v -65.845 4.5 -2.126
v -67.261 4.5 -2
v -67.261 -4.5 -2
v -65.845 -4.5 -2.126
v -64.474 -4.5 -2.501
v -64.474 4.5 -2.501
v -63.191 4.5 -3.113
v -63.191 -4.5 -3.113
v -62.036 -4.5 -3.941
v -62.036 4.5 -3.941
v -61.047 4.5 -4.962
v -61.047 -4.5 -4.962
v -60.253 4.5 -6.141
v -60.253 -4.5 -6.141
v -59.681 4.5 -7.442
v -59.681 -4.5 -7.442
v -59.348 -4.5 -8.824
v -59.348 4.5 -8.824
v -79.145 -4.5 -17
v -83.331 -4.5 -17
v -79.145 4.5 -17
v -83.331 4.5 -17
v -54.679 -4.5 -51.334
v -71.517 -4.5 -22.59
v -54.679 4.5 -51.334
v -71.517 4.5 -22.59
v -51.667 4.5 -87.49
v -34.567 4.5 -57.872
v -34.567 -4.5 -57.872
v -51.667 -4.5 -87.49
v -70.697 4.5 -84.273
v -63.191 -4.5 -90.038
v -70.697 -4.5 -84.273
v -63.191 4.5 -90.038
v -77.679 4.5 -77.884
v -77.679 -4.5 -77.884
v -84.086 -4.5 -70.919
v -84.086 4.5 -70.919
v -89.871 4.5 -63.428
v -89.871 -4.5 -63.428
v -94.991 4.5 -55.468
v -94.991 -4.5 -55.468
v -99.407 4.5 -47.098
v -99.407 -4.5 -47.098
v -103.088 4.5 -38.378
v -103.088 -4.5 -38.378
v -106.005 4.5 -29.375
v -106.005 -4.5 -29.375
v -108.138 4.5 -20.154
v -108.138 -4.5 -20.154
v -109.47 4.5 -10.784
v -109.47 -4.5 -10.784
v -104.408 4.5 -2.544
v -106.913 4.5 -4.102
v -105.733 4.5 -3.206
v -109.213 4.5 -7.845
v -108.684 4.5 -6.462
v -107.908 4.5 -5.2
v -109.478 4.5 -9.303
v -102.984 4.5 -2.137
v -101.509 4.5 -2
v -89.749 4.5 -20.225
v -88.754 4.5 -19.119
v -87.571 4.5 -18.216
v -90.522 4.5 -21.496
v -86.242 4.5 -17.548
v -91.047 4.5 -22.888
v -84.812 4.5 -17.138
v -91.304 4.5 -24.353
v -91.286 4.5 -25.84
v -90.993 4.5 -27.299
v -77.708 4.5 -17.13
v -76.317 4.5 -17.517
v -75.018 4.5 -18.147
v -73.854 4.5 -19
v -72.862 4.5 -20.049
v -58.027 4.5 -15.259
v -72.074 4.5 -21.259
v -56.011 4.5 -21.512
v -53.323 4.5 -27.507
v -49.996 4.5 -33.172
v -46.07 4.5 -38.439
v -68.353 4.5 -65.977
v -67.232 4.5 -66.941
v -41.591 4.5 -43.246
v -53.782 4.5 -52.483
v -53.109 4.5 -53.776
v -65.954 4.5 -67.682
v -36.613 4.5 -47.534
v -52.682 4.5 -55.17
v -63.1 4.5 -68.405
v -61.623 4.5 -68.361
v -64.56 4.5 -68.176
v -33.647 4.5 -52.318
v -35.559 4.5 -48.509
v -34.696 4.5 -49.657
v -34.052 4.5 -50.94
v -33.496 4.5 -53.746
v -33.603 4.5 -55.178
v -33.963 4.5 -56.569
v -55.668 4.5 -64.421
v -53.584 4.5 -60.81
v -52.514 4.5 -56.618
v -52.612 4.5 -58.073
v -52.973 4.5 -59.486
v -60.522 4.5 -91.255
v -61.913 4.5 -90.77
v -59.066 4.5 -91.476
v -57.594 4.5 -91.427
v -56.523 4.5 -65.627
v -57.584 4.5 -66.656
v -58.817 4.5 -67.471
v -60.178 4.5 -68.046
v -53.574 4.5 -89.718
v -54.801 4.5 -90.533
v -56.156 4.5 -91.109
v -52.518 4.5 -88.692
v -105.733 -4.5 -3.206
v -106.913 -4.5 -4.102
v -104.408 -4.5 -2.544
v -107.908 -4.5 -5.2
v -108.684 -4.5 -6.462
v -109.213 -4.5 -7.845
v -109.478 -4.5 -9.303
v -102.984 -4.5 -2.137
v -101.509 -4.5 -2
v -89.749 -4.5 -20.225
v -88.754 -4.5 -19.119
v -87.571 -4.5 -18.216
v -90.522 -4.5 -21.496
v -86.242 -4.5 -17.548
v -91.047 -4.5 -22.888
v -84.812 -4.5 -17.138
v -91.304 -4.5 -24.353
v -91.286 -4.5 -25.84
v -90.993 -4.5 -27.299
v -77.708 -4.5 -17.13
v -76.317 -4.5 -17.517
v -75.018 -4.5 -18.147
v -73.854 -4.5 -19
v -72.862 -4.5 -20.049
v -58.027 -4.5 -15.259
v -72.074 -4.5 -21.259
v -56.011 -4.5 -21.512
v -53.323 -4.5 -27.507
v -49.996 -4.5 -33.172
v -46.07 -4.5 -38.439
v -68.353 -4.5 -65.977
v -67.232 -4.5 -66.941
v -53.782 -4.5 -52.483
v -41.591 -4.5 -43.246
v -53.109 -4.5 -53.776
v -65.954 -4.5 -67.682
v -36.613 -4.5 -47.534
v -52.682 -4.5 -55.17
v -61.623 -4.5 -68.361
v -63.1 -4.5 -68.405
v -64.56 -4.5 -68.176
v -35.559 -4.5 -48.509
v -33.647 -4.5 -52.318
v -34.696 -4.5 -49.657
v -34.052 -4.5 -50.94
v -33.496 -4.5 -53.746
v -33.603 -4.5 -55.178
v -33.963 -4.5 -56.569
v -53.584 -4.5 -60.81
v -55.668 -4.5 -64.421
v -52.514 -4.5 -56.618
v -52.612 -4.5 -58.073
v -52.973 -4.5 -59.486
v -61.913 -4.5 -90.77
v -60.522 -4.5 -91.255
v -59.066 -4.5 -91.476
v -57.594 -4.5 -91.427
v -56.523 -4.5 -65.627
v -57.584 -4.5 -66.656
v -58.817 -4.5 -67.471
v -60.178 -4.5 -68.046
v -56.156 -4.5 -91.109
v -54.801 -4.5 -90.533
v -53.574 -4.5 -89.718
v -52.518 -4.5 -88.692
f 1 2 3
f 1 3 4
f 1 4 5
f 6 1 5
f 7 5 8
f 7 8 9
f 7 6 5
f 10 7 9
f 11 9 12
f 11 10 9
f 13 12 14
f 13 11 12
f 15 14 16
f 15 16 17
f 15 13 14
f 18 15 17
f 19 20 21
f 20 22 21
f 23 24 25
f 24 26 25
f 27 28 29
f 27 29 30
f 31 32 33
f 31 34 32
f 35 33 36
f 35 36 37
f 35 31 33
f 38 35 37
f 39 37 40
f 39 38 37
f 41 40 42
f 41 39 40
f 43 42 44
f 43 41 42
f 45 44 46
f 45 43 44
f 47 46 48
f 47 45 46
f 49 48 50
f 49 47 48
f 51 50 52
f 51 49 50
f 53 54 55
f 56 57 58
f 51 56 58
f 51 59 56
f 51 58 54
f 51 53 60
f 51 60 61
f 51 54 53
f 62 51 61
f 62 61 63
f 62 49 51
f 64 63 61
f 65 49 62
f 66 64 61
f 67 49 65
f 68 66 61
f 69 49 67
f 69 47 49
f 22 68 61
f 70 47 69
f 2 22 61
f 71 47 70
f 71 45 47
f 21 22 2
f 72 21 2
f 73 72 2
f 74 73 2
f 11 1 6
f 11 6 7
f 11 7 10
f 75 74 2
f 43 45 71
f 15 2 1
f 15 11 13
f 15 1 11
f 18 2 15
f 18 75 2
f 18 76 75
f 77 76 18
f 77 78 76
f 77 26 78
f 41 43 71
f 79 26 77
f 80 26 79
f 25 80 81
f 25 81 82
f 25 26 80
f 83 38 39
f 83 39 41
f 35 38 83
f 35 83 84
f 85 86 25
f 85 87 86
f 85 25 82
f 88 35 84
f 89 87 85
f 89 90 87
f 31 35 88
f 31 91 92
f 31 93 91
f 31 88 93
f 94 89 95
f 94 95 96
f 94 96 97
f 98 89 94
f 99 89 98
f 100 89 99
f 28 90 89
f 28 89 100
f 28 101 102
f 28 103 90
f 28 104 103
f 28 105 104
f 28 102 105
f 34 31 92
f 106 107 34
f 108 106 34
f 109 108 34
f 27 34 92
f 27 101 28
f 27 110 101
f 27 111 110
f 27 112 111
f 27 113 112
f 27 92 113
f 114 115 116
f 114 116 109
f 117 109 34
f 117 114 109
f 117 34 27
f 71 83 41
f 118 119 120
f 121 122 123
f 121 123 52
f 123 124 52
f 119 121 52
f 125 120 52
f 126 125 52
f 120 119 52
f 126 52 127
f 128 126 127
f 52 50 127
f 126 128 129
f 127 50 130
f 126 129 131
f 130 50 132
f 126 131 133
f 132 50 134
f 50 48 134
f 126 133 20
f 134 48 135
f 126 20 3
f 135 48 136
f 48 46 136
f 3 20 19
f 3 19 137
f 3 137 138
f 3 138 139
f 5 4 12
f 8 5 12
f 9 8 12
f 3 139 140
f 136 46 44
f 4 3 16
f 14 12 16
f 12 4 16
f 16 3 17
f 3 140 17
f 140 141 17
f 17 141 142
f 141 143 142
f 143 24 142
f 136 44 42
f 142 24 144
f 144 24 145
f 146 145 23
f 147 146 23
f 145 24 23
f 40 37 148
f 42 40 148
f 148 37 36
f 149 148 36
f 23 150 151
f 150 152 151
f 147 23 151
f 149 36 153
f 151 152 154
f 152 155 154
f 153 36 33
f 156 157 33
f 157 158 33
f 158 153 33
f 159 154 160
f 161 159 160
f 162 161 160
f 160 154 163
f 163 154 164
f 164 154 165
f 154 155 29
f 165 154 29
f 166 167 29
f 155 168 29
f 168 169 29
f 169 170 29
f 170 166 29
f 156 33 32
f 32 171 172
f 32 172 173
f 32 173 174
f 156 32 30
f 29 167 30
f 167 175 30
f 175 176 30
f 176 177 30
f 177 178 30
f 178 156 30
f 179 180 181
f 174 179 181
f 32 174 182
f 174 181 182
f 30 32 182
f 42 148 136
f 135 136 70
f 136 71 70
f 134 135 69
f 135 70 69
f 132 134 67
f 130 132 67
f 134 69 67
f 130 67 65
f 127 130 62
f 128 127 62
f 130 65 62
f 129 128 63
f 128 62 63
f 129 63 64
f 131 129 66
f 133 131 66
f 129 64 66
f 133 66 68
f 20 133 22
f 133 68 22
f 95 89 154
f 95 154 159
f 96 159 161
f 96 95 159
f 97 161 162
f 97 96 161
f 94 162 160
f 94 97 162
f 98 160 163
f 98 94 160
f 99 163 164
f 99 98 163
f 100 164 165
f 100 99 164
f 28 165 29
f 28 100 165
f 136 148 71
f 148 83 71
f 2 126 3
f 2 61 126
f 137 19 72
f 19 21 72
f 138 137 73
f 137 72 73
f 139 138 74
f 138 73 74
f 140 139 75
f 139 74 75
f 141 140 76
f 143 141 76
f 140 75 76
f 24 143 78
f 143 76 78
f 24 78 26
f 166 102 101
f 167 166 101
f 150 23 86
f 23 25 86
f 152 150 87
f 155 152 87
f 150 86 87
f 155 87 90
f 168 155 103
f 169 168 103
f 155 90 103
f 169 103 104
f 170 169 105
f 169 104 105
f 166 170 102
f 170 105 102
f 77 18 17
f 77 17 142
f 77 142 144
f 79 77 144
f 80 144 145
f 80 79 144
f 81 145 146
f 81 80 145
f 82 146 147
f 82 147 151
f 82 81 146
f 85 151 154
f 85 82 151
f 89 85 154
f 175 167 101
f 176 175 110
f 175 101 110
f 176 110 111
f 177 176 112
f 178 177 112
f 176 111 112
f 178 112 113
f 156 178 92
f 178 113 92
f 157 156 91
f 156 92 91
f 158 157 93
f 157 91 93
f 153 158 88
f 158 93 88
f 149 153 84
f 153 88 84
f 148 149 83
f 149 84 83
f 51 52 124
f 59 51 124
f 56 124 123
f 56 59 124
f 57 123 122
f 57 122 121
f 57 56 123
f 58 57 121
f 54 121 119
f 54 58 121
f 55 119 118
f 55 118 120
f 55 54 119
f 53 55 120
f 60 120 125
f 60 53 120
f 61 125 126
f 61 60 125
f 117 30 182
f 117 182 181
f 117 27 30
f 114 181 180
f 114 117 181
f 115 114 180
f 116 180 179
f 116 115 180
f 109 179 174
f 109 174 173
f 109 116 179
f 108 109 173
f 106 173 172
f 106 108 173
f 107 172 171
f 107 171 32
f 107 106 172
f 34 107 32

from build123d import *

# Parameters (mm, degrees)
BOSS_EXTRUDE1_DEPTH = 4.5


with BuildPart() as part:
    # Sketch1 → Boss-Extrude1 (new, symmetric)
    with BuildSketch(Plane(origin=(0, 0, 0), x_dir=(1, 0, 0), z_dir=(0, 1, 0))):
        with BuildLine():
            Line((-101.508620324, 2), (-67.260686883, 2))
            ThreePointArc((-67.260686883, 2), (-62.036309634, 3.941462028), (-59.347664897, 8.823529412))
            ThreePointArc((-59.347664897, 8.823529412), (-51.737318493, 30.385027154), (-36.613340144, 47.533812423))
            ThreePointArc((-36.613340144, 47.533812423), (-33.647401917, 52.31816148), (-34.5669156, 57.87165408))
            Line((-34.5669156, 57.87165408), (-51.667108069, 87.490056256))
            ThreePointArc((-51.667108069, 87.490056256), (-56.868026794, 91.301361412), (-63.19102199, 90.038295963))
            ThreePointArc((-63.19102199, 90.038295963), (-94.99085495, 55.468346611), (-109.470080741, 10.784313725))
            ThreePointArc((-109.470080741, 10.784313725), (-107.436288913, 4.627594105), (-101.508620324, 2))
        make_face()
        with BuildLine():
            Line((-53.583601177, 60.80951969), (-55.668486055, 64.420646227))
            ThreePointArc((-55.668486055, 64.420646227), (-61.622662682, 68.361129347), (-68.352706691, 65.97656772))
            Line((-68.352706691, 65.97656772), (-90.993256658, 27.298850575))
            ThreePointArc((-90.993256658, 27.298850575), (-89.749031081, 20.224584028), (-83.330666624, 17))
            Line((-83.330666624, 17), (-79.14543575, 17))
            ThreePointArc((-79.14543575, 17), (-74.41664671, 18.547205705), (-71.516960015, 22.590361446))
            Line((-71.516960015, 22.590361446), (-54.679341331, 51.333903335))
            ThreePointArc((-54.679341331, 51.333903335), (-52.564762349, 55.890540621), (-53.583601177, 60.80951969))
        make_face(mode=Mode.SUBTRACT)
    extrude(amount=BOSS_EXTRUDE1_DEPTH, both=True)


solid = part.part
